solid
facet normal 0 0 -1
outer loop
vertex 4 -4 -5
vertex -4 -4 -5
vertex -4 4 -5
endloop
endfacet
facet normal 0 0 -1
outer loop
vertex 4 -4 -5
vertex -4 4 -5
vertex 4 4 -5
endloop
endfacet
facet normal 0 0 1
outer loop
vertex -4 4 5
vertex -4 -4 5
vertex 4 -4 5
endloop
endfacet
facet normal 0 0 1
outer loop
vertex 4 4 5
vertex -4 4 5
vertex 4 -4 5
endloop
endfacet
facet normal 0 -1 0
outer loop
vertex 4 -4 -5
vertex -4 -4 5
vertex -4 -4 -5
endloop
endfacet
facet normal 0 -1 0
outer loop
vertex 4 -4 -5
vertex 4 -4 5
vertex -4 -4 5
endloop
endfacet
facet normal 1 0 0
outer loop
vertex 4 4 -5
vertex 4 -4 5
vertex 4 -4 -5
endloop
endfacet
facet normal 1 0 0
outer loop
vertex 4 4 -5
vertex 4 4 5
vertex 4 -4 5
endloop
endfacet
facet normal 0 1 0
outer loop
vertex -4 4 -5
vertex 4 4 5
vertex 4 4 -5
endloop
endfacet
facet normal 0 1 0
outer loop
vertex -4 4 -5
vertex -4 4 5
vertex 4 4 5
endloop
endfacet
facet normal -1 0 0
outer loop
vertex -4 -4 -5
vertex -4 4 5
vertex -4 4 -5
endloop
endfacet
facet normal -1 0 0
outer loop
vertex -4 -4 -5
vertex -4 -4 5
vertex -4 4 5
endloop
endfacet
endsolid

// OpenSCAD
// Construct: linear_extrude() centered about z = 0.
linear_extrude(height = 10, center = true) square(8, center = true);
